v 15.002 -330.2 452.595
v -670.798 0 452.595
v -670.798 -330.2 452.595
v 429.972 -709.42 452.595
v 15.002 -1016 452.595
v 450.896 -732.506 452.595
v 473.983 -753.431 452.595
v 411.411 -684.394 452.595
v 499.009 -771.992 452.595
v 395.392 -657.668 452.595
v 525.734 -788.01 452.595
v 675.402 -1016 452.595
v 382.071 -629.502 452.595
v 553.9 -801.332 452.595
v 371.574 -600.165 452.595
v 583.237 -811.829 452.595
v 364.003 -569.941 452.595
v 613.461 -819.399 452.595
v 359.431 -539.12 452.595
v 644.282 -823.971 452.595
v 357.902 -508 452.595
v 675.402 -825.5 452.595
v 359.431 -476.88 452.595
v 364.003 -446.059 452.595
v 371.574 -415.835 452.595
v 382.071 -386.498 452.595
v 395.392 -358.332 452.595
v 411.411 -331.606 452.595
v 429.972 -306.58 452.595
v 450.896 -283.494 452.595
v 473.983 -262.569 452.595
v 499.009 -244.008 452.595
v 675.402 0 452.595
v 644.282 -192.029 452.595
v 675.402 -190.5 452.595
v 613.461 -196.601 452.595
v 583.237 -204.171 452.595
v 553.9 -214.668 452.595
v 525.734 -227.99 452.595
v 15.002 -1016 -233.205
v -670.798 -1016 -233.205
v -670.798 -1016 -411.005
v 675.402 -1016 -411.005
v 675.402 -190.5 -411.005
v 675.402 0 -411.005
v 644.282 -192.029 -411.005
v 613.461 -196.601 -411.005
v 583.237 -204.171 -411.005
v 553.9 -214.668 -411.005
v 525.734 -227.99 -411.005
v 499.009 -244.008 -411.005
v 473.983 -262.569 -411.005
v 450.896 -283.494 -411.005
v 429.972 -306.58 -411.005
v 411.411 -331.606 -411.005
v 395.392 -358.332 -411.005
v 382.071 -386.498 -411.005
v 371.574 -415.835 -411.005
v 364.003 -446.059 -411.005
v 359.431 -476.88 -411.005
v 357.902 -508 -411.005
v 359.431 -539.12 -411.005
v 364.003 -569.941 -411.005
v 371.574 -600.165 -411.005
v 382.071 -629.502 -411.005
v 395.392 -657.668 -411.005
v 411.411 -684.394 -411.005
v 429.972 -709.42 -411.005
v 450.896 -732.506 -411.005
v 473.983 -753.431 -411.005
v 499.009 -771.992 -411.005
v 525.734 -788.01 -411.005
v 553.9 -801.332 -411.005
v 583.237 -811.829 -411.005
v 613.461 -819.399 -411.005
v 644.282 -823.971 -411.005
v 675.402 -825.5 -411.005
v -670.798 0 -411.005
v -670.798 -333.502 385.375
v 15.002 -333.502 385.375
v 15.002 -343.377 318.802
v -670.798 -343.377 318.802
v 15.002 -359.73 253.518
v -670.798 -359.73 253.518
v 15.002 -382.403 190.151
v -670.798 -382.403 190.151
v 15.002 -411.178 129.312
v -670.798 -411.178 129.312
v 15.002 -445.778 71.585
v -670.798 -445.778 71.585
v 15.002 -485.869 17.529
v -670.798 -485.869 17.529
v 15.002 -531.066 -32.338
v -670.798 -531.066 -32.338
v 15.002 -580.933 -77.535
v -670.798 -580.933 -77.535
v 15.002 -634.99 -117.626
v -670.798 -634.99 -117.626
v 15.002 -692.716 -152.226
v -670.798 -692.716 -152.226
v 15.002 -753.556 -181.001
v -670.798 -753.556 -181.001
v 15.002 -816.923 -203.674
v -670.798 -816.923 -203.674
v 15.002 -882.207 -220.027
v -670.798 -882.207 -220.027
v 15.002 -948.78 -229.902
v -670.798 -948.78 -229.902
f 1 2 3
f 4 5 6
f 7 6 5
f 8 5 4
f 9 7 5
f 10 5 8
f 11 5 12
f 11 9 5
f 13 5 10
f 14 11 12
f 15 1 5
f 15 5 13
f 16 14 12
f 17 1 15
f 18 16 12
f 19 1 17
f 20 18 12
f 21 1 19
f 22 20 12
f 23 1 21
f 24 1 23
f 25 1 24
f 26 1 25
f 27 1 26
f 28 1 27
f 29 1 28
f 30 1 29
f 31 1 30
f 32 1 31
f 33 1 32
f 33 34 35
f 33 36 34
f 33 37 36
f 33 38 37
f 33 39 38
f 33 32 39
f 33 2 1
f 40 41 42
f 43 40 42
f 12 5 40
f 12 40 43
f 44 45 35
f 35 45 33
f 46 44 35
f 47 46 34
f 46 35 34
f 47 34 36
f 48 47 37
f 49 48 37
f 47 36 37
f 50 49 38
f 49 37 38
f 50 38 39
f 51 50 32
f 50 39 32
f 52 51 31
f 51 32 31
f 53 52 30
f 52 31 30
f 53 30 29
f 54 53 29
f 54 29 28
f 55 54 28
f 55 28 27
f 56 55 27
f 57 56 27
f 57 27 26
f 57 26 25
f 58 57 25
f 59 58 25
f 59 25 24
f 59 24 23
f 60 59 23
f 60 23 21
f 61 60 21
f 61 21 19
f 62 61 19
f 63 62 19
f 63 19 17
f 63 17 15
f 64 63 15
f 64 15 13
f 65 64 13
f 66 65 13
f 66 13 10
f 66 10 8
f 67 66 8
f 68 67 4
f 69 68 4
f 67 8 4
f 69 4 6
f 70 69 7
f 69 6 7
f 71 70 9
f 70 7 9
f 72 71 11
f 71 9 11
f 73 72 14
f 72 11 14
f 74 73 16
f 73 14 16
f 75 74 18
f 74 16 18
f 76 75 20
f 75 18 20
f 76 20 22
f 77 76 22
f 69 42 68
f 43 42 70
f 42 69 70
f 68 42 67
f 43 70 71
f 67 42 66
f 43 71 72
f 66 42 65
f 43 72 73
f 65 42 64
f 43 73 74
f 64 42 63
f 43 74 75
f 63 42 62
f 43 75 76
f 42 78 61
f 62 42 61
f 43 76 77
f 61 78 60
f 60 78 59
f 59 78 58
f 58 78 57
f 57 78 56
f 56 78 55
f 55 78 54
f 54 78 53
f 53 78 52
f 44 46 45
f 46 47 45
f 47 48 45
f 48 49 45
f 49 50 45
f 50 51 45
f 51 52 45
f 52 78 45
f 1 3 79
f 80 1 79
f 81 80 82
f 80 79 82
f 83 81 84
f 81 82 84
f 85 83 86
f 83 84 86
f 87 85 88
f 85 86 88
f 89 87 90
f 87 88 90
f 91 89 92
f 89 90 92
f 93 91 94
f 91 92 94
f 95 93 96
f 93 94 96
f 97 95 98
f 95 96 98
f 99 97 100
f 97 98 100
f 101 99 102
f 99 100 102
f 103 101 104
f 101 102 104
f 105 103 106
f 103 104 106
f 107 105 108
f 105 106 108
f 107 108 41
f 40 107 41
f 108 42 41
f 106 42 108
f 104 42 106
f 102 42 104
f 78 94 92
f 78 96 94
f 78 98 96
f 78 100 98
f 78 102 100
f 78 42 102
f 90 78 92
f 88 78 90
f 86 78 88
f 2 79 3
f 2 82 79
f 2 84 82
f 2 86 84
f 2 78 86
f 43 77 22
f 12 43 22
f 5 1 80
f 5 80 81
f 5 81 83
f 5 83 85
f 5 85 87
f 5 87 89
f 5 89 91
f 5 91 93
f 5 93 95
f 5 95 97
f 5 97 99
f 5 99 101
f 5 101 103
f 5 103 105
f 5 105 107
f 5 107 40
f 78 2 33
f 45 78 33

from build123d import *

# Parameters (mm, degrees)
F0_W     = 1346.2
F0_H     = 863.6
F1_DEPTH = 1016
F2_R     = 317.5
F3_DEPTH = 863.6
F4_R     = 685.8
F5_DEPTH = 685.8


with BuildPart() as f1:
    # F0 (on Front) → F1 (new body)
    with BuildSketch(Plane.XZ):
        with Locations((2.302447, 20.795441)):
            Rectangle(F0_W, F0_H)
    extrude(amount=F1_DEPTH)

    # F2 (on face) → F3 (cut)
    with BuildSketch(Plane.XY.offset(452.595441)):
        with Locations((675.402447, -508)):
            Circle(F2_R)
    extrude(amount=-F3_DEPTH, mode=Mode.SUBTRACT)

    # F4 (on face) → F5 (cut)
    with BuildSketch(Plane(origin=(-670.797553, 0, 0), x_dir=(0, -1, 0), z_dir=(-1, 0, 0))):
        with Locations((1016, 452.595441)):
            Circle(F4_R)
    extrude(amount=-F5_DEPTH, mode=Mode.SUBTRACT)


solid = f1.part
